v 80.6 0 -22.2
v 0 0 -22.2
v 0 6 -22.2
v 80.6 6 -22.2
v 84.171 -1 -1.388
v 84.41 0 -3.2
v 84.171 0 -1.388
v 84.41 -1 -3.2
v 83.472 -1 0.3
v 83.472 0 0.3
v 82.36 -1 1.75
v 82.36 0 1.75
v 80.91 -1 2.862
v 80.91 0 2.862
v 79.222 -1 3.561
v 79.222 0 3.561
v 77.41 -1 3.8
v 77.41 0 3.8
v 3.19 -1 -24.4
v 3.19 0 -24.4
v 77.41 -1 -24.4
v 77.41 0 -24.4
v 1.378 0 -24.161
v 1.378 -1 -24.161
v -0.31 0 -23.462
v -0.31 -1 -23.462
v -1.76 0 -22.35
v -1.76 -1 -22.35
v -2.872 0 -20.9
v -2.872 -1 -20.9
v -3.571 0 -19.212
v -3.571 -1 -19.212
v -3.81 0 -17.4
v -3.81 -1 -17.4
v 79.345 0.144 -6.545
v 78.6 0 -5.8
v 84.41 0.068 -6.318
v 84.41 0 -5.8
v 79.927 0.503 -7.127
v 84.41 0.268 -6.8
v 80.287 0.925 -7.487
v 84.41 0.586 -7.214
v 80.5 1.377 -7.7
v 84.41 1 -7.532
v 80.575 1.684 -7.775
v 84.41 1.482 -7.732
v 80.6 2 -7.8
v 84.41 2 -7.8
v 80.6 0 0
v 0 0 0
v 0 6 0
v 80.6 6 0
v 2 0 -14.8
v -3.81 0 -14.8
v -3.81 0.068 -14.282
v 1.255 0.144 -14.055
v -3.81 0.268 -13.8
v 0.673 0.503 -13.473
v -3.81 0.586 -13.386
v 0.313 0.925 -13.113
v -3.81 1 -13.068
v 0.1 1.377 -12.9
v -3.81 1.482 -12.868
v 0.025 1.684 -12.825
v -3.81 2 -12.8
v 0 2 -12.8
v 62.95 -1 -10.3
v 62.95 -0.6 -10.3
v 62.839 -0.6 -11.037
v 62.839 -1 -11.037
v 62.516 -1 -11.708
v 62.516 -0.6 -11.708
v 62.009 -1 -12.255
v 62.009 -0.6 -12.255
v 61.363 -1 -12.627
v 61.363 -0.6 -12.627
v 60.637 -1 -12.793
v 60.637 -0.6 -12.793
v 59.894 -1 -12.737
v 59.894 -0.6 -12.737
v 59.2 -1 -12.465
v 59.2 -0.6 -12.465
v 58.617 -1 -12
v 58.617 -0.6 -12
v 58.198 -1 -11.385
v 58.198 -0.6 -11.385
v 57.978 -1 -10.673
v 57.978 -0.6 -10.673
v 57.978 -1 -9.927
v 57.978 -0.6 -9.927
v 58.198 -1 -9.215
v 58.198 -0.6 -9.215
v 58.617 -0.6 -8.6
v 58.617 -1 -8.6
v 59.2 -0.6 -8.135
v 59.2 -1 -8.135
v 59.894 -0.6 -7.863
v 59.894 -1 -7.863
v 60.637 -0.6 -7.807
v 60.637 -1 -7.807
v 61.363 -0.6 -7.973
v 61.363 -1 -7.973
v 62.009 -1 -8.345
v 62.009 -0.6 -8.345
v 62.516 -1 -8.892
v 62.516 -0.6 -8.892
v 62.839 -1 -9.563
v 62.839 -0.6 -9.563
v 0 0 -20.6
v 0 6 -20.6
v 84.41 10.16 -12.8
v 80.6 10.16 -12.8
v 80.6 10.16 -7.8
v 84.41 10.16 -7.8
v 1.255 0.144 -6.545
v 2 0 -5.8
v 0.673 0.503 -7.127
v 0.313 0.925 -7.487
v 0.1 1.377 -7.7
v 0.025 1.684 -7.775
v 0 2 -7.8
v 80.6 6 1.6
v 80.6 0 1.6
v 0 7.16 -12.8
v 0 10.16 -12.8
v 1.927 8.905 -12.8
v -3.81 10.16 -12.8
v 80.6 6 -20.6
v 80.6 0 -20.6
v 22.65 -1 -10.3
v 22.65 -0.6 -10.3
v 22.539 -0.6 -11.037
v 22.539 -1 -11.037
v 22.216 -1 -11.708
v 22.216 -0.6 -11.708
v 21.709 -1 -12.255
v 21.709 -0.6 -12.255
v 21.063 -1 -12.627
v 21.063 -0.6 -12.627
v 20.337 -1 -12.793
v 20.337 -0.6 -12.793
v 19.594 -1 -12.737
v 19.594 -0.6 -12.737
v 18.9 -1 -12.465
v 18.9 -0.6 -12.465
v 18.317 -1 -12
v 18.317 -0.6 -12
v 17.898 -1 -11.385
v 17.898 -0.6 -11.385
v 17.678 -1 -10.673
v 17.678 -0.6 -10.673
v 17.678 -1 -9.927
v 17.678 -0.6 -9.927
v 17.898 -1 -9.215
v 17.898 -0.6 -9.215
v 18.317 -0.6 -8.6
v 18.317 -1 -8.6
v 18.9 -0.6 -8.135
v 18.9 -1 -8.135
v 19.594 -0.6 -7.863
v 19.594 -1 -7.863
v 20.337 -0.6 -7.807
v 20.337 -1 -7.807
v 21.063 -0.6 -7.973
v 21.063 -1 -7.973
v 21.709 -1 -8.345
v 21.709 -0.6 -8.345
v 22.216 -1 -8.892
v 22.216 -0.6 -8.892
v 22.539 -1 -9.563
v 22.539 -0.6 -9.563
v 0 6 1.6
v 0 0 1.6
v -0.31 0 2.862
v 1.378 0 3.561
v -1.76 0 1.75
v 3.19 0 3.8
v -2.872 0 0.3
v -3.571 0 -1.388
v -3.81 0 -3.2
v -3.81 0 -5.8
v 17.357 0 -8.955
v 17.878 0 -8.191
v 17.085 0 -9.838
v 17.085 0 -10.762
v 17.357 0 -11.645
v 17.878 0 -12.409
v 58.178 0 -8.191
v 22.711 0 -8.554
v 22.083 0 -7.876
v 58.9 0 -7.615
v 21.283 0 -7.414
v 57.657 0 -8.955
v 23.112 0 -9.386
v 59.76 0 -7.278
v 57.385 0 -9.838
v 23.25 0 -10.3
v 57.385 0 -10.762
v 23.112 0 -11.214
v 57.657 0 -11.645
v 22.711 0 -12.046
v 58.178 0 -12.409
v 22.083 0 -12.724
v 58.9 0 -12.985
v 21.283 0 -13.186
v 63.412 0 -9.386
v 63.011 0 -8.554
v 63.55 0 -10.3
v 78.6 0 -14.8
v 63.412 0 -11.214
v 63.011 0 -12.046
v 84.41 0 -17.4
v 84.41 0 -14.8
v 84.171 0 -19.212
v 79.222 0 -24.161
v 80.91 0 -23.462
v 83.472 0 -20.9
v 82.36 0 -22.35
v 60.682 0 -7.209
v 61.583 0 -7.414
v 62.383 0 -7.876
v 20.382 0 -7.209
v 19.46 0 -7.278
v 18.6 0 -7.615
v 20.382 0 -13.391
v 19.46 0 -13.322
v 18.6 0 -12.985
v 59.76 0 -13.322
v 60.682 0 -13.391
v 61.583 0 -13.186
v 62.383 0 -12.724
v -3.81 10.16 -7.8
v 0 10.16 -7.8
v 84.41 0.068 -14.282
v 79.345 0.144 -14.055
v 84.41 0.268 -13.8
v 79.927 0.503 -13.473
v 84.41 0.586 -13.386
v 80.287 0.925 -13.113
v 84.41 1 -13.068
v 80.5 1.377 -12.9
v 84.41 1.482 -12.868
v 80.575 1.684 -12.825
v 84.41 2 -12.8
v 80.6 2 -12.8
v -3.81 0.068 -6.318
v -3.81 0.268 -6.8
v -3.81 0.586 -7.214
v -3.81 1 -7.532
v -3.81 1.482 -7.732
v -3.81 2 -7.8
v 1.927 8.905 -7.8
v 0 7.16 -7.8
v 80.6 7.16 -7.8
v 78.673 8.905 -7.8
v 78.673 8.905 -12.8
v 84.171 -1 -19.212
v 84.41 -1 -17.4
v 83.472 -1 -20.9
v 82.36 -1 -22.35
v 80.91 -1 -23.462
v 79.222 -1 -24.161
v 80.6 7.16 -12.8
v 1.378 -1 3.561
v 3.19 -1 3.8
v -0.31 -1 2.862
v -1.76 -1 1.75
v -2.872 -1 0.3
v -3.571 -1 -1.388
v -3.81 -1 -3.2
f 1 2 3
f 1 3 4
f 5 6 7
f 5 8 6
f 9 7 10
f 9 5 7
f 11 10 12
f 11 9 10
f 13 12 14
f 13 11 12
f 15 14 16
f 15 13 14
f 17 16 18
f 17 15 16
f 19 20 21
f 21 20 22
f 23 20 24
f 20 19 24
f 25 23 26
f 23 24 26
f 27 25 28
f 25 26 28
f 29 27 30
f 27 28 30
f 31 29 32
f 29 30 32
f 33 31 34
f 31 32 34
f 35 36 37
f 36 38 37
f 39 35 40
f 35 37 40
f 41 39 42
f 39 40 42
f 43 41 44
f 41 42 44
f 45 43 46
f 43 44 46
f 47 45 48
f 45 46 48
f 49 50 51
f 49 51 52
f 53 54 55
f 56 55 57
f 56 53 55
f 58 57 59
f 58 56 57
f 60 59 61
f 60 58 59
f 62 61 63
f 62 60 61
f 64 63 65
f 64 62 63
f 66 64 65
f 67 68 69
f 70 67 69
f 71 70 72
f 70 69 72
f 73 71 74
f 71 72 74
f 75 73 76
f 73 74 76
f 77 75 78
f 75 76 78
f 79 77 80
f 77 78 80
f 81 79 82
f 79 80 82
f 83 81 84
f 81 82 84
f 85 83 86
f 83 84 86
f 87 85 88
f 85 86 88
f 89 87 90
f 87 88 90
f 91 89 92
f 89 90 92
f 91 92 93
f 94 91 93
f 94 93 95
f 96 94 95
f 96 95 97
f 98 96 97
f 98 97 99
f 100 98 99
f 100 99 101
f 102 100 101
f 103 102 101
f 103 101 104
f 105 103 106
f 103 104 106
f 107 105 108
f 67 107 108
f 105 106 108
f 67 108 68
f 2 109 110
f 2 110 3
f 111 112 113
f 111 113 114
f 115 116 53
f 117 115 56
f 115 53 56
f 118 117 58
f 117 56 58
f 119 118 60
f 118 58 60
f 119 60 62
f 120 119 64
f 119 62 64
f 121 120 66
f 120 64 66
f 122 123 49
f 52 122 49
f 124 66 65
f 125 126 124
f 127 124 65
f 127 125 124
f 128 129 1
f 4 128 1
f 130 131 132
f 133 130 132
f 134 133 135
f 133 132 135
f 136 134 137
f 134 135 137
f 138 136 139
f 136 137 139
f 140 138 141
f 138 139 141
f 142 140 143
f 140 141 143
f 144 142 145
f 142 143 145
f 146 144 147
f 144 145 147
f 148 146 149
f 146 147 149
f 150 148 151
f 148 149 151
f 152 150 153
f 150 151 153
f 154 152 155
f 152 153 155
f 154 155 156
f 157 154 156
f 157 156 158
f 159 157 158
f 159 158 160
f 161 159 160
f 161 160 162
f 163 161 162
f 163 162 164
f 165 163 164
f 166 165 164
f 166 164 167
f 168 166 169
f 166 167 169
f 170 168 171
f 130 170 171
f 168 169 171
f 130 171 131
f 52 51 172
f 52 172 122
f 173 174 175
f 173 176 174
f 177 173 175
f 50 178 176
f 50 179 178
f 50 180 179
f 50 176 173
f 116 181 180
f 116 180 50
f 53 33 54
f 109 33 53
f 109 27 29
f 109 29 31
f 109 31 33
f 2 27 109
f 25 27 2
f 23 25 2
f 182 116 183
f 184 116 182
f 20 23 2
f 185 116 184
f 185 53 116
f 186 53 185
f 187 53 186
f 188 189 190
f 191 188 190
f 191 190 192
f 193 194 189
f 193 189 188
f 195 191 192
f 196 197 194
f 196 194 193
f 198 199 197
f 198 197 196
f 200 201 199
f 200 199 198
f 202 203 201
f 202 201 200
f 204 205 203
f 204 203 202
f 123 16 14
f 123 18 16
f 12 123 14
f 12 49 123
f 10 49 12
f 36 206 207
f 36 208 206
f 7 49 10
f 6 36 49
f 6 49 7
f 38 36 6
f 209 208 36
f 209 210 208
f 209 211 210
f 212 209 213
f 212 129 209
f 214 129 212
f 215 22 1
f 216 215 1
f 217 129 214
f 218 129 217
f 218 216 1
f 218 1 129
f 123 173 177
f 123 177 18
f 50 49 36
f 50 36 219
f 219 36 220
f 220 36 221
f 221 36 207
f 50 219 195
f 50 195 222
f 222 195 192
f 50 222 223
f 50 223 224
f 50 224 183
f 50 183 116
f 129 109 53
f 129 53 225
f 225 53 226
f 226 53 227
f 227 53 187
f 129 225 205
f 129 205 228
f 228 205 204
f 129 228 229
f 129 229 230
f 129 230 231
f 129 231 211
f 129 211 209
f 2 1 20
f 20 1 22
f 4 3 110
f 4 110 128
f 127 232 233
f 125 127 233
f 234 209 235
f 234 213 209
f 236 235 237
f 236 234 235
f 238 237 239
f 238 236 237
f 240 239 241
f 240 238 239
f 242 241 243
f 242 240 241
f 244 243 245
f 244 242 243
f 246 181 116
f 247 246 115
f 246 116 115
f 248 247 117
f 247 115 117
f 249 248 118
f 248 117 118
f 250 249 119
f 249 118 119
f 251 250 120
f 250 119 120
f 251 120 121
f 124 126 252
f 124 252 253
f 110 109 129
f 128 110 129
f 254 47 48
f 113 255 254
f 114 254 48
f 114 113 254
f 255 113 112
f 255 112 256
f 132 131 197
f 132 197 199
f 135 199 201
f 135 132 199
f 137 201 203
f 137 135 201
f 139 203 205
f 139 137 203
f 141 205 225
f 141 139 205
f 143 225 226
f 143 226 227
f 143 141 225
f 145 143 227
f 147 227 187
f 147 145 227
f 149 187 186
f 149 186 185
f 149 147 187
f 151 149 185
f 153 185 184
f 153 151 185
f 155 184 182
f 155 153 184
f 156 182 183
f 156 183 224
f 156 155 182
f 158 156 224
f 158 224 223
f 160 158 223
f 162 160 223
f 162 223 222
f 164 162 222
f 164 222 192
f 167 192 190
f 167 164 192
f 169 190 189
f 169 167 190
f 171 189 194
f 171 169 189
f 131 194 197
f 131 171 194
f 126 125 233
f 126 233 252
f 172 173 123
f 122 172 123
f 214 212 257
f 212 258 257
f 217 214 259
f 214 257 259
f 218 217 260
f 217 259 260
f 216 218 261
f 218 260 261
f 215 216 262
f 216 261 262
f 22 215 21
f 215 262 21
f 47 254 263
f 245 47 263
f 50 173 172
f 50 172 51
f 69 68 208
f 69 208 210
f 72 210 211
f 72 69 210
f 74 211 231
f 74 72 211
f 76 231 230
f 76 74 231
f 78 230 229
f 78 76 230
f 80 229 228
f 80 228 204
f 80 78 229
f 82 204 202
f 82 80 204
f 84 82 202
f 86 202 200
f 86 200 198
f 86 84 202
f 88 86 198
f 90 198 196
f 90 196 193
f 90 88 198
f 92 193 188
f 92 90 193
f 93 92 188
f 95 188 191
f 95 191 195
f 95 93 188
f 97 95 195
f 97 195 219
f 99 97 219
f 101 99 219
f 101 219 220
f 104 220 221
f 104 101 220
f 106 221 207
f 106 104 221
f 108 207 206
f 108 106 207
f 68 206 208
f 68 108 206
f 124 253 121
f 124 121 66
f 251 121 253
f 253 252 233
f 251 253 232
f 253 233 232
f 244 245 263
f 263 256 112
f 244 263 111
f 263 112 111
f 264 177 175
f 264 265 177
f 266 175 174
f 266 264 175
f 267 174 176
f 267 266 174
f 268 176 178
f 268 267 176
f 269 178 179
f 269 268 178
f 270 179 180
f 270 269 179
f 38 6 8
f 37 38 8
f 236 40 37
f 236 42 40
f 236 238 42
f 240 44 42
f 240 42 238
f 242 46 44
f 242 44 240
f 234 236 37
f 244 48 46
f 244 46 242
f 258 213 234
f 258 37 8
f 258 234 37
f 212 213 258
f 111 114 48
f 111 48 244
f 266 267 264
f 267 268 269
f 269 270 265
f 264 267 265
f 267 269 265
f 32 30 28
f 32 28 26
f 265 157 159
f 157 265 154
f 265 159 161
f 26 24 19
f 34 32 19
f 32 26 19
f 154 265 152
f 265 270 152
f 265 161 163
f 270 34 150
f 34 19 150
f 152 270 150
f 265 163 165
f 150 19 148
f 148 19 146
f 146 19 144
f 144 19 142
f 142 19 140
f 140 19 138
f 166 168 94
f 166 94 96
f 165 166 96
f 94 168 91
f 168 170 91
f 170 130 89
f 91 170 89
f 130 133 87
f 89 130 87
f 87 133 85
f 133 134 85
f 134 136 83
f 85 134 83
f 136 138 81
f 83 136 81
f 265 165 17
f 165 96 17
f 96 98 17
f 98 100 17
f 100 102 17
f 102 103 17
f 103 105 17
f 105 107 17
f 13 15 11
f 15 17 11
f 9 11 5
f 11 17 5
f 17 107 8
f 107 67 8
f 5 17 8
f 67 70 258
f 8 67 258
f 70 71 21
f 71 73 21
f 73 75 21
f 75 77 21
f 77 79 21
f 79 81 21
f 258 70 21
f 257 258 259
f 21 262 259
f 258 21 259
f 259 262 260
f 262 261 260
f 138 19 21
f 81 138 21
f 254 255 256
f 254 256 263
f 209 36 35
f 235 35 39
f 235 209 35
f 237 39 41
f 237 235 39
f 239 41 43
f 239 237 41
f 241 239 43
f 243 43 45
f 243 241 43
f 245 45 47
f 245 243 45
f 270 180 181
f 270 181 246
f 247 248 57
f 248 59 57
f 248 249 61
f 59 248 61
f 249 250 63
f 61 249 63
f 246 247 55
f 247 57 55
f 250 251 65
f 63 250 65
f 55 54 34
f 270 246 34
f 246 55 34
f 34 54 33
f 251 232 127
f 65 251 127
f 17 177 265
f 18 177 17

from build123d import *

# Parameters (mm, degrees)
SKETCH1_W           = 88.22
SKETCH1_H           = 28.2
SKETCH1_R           = 2.5
BOSS_EXTRUDE1_DEPTH = 1
SKETCH1_3_W         = 3.81
SKETCH1_3_H         = 5
BOSS_EXTRUDE2_DEPTH = 10.16
SKETCH1_4_W         = 80.6
SKETCH1_4_H         = 1.6
BOSS_EXTRUDE3_DEPTH = 6
BOSS_EXTRUDE4_DEPTH = 5
FILLET1_R           = 7
FILLET2_R           = 2
CHAMFER1_SIZE       = 0.6


with BuildPart() as part:
    # Sketch1 → Boss-Extrude1 (new body)
    with BuildSketch(Plane(origin=(0, 0, 0), x_dir=(1, 0, 0), z_dir=(0, 1, 0))):
        with Locations((40.3, 10.3)):
            Rectangle(SKETCH1_W, SKETCH1_H)
        with Locations((20.15, 10.3)):
            Circle(SKETCH1_R, mode=Mode.SUBTRACT)
        with Locations((60.45, 10.3)):
            Circle(SKETCH1_R, mode=Mode.SUBTRACT)
    extrude(amount=-BOSS_EXTRUDE1_DEPTH)

    # Sketch1<3> → Boss-Extrude2 (add)
    with BuildSketch(Plane(origin=(0, 0, 0), x_dir=(1, 0, 0), z_dir=(0, 1, 0))):
        with Locations((-1.905, 10.3)):
            Rectangle(SKETCH1_3_W, SKETCH1_3_H)
        with Locations((82.505, 10.3)):
            Rectangle(SKETCH1_3_W, SKETCH1_3_H)
    extrude(amount=BOSS_EXTRUDE2_DEPTH)

    # Sketch1<4> → Boss-Extrude3 (add)
    with BuildSketch(Plane(origin=(0, 0, 0), x_dir=(1, 0, 0), z_dir=(0, 1, 0))):
        with Locations((40.3, -0.8)):
            Rectangle(SKETCH1_4_W, SKETCH1_4_H)
        with Locations((40.3, 21.4)):
            Rectangle(SKETCH1_4_W, SKETCH1_4_H)
    extrude(amount=BOSS_EXTRUDE3_DEPTH)

    # Sketch2 → Boss-Extrude4 (add)
    with BuildSketch(Plane.XY.offset(-7.8)):
        Polygon((0, 10.16), (1.927427041, 8.905), (0, 7.16), align=None)
    boss_extrude4 = extrude(amount=-BOSS_EXTRUDE4_DEPTH)

    # Mirror1: Boss-Extrude4 across plane
    add(boss_extrude4.mirror(Plane.ZY.offset(-40.3)))

    # Fillet1
    fillet1_edges = [part.edges().sort_by_distance(p)[0] for p in [
        (84.41, -0.5, 3.8),
        (-3.81, -0.5, 3.8),
        (-3.81, -0.5, -24.4),
        (84.41, -0.5, -24.4),
    ]]
    fillet(fillet1_edges, radius=FILLET1_R)

    # Fillet2
    fillet2_edges = [part.edges().sort_by_distance(p)[0] for p in [
        (0, 0, -10.3),
        (-1.905, 0, -12.8),
        (-1.905, 0, -7.8),
        (82.505, 0, -7.8),
        (80.6, 0, -10.3),
        (82.505, 0, -12.8),
    ]]
    fillet(fillet2_edges, radius=FILLET2_R)

    # Chamfer1
    chamfer1_edges = [part.edges().sort_by_distance(p)[0] for p in [
        (17.65, 0, -10.3),
        (57.95, 0, -10.3),
    ]]
    chamfer(chamfer1_edges, length=CHAMFER1_SIZE)


solid = part.part
